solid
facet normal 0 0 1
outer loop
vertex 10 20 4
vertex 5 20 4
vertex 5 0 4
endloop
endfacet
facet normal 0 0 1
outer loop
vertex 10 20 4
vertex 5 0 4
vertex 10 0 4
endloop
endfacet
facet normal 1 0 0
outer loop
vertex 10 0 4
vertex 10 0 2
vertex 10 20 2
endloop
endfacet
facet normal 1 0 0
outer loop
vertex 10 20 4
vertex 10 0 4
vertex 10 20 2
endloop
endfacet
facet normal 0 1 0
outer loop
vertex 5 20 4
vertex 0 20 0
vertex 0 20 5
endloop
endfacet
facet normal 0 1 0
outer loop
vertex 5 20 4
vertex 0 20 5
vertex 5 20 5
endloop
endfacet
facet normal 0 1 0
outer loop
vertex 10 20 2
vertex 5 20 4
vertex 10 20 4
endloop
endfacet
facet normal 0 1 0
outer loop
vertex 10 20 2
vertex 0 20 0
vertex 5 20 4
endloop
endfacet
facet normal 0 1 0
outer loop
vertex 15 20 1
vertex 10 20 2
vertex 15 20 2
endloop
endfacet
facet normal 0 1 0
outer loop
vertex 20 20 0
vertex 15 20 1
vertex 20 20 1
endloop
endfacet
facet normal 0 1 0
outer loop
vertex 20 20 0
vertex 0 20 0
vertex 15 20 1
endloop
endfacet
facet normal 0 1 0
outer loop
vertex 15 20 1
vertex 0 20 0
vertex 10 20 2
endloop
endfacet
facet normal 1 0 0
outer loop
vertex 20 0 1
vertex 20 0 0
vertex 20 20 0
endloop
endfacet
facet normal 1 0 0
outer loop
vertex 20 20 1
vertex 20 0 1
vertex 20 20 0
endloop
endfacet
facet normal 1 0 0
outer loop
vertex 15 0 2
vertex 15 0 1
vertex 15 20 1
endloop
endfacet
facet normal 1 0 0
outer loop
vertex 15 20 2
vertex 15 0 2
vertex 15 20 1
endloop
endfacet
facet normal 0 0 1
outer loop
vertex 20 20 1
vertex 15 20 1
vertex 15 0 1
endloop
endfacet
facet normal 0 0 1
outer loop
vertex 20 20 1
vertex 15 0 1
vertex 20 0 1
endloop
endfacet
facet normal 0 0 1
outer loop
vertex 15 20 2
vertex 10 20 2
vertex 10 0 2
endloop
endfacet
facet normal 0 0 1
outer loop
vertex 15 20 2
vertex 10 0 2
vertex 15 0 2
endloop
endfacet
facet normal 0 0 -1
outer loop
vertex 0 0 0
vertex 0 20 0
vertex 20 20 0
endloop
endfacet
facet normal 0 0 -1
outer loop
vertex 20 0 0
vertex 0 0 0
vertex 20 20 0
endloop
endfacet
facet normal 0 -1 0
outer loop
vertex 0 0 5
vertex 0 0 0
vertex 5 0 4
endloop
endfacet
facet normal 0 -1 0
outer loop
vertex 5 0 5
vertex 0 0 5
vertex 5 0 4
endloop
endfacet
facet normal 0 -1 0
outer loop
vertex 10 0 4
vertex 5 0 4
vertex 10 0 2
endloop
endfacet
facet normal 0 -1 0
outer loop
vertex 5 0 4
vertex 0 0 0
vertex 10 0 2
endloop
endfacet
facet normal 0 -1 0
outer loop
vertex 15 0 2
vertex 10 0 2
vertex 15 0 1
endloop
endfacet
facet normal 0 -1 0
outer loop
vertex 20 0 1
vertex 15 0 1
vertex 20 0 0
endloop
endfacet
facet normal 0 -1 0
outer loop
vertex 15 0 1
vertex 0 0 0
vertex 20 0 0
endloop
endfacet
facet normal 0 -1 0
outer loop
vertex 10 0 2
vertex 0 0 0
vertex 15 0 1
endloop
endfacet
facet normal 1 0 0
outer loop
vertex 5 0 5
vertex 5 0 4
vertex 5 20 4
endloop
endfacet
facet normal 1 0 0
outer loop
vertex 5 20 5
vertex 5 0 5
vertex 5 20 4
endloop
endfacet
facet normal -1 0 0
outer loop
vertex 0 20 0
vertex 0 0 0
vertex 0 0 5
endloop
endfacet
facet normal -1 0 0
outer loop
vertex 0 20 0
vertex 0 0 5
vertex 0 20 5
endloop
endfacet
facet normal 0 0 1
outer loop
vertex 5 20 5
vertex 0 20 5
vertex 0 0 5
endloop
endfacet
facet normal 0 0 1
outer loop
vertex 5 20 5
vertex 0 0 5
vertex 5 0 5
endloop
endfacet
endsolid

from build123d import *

# Parameters (mm, degrees)
F0_W     = 5
F0_H     = 20
F1_DEPTH = 5
F2_DEPTH = 4
F3_DEPTH = 2
F4_DEPTH = 1


with BuildPart() as f1:
    # F0 (on Top) → F1 (new body)
    with BuildSketch(Plane.XY):
        with Locations((2.5, 10)):
            Rectangle(F0_W, F0_H)
    extrude(amount=F1_DEPTH)

    # F0 (on Top) → F2 (join)
    with BuildSketch(Plane.XY):
        with Locations((7.5, 10)):
            Rectangle(F0_W, F0_H)
    extrude(amount=F2_DEPTH)

    # F0 (on Top) → F3 (join)
    with BuildSketch(Plane.XY):
        with Locations((12.5, 10)):
            Rectangle(F0_W, F0_H)
    extrude(amount=F3_DEPTH)

    # F0 (on Top) → F4 (join)
    with BuildSketch(Plane.XY):
        with Locations((17.5, 10)):
            Rectangle(F0_W, F0_H)
    extrude(amount=F4_DEPTH)


solid = f1.part
